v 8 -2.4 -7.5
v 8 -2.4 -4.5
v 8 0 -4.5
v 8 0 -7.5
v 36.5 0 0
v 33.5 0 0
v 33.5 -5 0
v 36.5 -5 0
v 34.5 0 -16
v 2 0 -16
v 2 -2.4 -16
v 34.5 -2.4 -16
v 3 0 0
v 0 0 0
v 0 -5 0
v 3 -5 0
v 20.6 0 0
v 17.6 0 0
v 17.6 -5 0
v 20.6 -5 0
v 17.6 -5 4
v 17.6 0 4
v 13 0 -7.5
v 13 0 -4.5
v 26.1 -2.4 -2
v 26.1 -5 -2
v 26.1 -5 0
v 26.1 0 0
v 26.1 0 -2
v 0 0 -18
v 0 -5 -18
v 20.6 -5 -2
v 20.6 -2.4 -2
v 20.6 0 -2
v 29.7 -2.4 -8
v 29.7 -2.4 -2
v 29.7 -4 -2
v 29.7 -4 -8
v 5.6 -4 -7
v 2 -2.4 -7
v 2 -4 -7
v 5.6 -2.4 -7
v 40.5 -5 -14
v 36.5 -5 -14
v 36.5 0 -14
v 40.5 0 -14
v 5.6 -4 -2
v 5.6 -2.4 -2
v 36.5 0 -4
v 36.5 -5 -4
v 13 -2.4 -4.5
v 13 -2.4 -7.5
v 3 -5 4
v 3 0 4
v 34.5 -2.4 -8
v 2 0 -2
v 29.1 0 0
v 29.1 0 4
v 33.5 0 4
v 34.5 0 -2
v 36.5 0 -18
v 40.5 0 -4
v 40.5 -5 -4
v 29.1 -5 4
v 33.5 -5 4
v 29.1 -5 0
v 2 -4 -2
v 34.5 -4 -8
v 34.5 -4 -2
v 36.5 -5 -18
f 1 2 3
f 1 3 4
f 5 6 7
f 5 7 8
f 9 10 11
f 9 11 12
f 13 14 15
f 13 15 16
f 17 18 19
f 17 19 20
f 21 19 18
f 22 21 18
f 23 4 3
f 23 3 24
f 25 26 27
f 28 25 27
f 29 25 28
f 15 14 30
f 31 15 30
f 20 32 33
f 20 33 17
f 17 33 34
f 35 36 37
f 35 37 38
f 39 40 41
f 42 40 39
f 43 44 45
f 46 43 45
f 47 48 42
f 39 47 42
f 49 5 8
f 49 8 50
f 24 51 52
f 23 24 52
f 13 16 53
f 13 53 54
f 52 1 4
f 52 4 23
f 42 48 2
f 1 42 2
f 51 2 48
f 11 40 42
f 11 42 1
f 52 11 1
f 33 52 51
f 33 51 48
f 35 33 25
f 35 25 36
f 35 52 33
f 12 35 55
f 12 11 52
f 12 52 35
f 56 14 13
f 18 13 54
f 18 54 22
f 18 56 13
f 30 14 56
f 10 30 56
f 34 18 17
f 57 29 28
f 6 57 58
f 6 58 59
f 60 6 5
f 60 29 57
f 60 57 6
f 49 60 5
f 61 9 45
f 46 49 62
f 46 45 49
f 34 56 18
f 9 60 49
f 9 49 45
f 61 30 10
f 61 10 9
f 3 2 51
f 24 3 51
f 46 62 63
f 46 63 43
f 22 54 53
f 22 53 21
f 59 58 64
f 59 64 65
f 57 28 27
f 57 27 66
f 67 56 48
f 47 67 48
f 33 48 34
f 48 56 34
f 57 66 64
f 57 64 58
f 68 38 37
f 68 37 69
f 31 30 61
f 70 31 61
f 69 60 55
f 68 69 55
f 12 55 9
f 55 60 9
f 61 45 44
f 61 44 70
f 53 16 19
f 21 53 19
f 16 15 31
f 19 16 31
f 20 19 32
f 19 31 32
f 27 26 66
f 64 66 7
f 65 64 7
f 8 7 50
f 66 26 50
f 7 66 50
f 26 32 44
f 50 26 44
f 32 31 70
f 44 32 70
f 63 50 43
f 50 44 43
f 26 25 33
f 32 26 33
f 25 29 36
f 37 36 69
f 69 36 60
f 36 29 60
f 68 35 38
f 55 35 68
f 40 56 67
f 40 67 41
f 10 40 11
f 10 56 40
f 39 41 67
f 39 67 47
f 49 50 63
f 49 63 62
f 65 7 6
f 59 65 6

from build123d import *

# Parameters (mm, degrees)
SKETCH1_W           = 36.5
SKETCH1_H           = 18
BOSS_EXTRUDE1_DEPTH = 5
SKETCH2_W           = 32.5
SKETCH2_H           = 14
CUT_EXTRUDE1_DEPTH  = 2.4
SKETCH3_W           = 5
SKETCH3_H           = 3
BOSS_EXTRUDE2_DEPTH = 2.4
CUT_EXTRUDE2_REACH  = 4
SKETCH4_W           = 5.5
SKETCH4_H           = 5
SKETCH5_W           = 3.6
SKETCH5_H           = 5
SKETCH5_W_2         = 4.8
SKETCH5_H_2         = 6
CUT_EXTRUDE3_DEPTH  = 1.6
SKETCH6_W           = 14.6
SKETCH6_H           = 5
SKETCH6_W_2         = 4.4
BOSS_EXTRUDE3_DEPTH = 4
SKETCH7_W           = 10
SKETCH7_H           = 5
BOSS_EXTRUDE4_DEPTH = 4


with BuildPart() as part:
    # Sketch1 → Boss-Extrude1 (new body)
    with BuildSketch(Plane(origin=(0, 0, 0), x_dir=(1, 0, 0), z_dir=(0, 1, 0))):
        with Locations((18.25, 9)):
            Rectangle(SKETCH1_W, SKETCH1_H)
    extrude(amount=-BOSS_EXTRUDE1_DEPTH)

    # Sketch2 → Cut-Extrude1 (cut)
    with BuildSketch(Plane(origin=(0, 0, 0), x_dir=(1, 0, 0), z_dir=(0, 1, 0))):
        with Locations((18.25, 9)):
            Rectangle(SKETCH2_W, SKETCH2_H)
    extrude(amount=-CUT_EXTRUDE1_DEPTH, mode=Mode.SUBTRACT)

    # Sketch3 → Boss-Extrude2 (add)
    with BuildSketch(Plane(origin=(0, -2.4, 0), x_dir=(1, 0, 0), z_dir=(0, 1, 0))):
        with Locations((10.5, 6)):
            Rectangle(SKETCH3_W, SKETCH3_H)
    extrude(amount=BOSS_EXTRUDE2_DEPTH)

    # Sketch4 → Cut-Extrude2 (cut, up to next)
    with BuildSketch(Plane(origin=(0, 0, -2), x_dir=(-1, 0, 0), z_dir=(0, 0, -1)), mode=Mode.PRIVATE) as cut_extrude2_sk1:
        with Locations((-23.35, -2.5)):
            Rectangle(SKETCH4_W, SKETCH4_H)
    cut_extrude2_tool1 = extrude(cut_extrude2_sk1.sketch, amount=-CUT_EXTRUDE2_REACH, mode=Mode.PRIVATE) & part.part
    add(cut_extrude2_tool1.solids().sort_by_distance((23.35, -2.5, -2))[0], mode=Mode.SUBTRACT)

    # Sketch5 → Cut-Extrude3 (cut)
    with BuildSketch(Plane(origin=(0, -2.4, 0), x_dir=(1, 0, 0), z_dir=(0, 1, 0))):
        with Locations((3.8, 4.5)):
            Rectangle(SKETCH5_W, SKETCH5_H)
        with Locations((32.1, 5)):
            Rectangle(SKETCH5_W_2, SKETCH5_H_2)
    extrude(amount=-CUT_EXTRUDE3_DEPTH, mode=Mode.SUBTRACT)

    # Sketch6 → Boss-Extrude3 (add)
    with BuildSketch(Plane.XY):
        with Locations((10.3, -2.5)):
            Rectangle(SKETCH6_W, SKETCH6_H)
        with Locations((31.3, -2.5)):
            Rectangle(SKETCH6_W_2, SKETCH6_H)
    extrude(amount=BOSS_EXTRUDE3_DEPTH)

    # Sketch7 → Boss-Extrude4 (add)
    with BuildSketch(Plane(origin=(36.5, 0, 0), x_dir=(0, 0, -1), z_dir=(1, 0, 0))):
        with Locations((9, -2.5)):
            Rectangle(SKETCH7_W, SKETCH7_H)
    extrude(amount=BOSS_EXTRUDE4_DEPTH)


solid = part.part
